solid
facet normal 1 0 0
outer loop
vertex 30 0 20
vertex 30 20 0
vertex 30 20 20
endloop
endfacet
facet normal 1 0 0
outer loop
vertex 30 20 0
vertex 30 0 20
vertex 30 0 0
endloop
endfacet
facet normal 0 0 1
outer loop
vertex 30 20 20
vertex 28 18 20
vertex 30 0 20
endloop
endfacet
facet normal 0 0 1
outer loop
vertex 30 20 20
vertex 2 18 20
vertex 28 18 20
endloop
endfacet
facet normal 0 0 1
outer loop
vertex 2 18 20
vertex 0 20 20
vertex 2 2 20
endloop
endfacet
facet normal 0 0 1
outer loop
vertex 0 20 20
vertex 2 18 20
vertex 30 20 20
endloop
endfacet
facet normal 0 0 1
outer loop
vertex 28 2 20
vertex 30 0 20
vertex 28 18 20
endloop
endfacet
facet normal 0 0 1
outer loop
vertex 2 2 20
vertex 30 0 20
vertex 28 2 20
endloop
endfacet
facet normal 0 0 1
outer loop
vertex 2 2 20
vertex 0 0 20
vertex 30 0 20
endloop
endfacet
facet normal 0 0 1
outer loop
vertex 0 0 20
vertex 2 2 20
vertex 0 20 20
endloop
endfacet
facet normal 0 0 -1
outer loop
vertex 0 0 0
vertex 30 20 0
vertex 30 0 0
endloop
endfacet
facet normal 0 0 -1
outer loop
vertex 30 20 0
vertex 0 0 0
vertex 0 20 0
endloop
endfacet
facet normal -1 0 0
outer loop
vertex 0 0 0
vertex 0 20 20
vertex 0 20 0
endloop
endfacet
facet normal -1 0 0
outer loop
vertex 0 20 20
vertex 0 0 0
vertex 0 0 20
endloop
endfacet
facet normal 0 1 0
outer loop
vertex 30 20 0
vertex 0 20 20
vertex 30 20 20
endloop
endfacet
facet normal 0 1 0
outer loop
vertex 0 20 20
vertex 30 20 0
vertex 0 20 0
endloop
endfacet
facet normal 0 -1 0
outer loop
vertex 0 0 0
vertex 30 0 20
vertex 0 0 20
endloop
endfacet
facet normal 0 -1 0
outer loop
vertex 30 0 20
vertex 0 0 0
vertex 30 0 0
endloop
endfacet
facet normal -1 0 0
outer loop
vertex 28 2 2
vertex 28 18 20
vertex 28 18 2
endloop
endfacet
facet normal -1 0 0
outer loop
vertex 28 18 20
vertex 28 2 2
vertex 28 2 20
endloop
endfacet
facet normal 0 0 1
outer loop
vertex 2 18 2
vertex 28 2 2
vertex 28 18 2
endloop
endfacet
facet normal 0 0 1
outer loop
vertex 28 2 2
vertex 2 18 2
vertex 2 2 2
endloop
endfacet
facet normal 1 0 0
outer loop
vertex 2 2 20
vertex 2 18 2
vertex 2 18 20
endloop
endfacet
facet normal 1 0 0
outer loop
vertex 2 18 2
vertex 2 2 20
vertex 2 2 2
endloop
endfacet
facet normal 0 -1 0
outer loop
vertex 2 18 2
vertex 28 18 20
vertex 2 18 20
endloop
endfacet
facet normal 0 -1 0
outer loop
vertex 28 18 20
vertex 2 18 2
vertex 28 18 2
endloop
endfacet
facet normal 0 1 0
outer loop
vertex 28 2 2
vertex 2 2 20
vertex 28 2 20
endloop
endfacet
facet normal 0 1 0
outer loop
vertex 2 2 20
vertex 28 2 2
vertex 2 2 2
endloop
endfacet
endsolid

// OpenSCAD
module h9v(){
  difference(){ cube([30,20,20]); translate([2,2,2]) cube([26,16,20]); }
}
h9v();
